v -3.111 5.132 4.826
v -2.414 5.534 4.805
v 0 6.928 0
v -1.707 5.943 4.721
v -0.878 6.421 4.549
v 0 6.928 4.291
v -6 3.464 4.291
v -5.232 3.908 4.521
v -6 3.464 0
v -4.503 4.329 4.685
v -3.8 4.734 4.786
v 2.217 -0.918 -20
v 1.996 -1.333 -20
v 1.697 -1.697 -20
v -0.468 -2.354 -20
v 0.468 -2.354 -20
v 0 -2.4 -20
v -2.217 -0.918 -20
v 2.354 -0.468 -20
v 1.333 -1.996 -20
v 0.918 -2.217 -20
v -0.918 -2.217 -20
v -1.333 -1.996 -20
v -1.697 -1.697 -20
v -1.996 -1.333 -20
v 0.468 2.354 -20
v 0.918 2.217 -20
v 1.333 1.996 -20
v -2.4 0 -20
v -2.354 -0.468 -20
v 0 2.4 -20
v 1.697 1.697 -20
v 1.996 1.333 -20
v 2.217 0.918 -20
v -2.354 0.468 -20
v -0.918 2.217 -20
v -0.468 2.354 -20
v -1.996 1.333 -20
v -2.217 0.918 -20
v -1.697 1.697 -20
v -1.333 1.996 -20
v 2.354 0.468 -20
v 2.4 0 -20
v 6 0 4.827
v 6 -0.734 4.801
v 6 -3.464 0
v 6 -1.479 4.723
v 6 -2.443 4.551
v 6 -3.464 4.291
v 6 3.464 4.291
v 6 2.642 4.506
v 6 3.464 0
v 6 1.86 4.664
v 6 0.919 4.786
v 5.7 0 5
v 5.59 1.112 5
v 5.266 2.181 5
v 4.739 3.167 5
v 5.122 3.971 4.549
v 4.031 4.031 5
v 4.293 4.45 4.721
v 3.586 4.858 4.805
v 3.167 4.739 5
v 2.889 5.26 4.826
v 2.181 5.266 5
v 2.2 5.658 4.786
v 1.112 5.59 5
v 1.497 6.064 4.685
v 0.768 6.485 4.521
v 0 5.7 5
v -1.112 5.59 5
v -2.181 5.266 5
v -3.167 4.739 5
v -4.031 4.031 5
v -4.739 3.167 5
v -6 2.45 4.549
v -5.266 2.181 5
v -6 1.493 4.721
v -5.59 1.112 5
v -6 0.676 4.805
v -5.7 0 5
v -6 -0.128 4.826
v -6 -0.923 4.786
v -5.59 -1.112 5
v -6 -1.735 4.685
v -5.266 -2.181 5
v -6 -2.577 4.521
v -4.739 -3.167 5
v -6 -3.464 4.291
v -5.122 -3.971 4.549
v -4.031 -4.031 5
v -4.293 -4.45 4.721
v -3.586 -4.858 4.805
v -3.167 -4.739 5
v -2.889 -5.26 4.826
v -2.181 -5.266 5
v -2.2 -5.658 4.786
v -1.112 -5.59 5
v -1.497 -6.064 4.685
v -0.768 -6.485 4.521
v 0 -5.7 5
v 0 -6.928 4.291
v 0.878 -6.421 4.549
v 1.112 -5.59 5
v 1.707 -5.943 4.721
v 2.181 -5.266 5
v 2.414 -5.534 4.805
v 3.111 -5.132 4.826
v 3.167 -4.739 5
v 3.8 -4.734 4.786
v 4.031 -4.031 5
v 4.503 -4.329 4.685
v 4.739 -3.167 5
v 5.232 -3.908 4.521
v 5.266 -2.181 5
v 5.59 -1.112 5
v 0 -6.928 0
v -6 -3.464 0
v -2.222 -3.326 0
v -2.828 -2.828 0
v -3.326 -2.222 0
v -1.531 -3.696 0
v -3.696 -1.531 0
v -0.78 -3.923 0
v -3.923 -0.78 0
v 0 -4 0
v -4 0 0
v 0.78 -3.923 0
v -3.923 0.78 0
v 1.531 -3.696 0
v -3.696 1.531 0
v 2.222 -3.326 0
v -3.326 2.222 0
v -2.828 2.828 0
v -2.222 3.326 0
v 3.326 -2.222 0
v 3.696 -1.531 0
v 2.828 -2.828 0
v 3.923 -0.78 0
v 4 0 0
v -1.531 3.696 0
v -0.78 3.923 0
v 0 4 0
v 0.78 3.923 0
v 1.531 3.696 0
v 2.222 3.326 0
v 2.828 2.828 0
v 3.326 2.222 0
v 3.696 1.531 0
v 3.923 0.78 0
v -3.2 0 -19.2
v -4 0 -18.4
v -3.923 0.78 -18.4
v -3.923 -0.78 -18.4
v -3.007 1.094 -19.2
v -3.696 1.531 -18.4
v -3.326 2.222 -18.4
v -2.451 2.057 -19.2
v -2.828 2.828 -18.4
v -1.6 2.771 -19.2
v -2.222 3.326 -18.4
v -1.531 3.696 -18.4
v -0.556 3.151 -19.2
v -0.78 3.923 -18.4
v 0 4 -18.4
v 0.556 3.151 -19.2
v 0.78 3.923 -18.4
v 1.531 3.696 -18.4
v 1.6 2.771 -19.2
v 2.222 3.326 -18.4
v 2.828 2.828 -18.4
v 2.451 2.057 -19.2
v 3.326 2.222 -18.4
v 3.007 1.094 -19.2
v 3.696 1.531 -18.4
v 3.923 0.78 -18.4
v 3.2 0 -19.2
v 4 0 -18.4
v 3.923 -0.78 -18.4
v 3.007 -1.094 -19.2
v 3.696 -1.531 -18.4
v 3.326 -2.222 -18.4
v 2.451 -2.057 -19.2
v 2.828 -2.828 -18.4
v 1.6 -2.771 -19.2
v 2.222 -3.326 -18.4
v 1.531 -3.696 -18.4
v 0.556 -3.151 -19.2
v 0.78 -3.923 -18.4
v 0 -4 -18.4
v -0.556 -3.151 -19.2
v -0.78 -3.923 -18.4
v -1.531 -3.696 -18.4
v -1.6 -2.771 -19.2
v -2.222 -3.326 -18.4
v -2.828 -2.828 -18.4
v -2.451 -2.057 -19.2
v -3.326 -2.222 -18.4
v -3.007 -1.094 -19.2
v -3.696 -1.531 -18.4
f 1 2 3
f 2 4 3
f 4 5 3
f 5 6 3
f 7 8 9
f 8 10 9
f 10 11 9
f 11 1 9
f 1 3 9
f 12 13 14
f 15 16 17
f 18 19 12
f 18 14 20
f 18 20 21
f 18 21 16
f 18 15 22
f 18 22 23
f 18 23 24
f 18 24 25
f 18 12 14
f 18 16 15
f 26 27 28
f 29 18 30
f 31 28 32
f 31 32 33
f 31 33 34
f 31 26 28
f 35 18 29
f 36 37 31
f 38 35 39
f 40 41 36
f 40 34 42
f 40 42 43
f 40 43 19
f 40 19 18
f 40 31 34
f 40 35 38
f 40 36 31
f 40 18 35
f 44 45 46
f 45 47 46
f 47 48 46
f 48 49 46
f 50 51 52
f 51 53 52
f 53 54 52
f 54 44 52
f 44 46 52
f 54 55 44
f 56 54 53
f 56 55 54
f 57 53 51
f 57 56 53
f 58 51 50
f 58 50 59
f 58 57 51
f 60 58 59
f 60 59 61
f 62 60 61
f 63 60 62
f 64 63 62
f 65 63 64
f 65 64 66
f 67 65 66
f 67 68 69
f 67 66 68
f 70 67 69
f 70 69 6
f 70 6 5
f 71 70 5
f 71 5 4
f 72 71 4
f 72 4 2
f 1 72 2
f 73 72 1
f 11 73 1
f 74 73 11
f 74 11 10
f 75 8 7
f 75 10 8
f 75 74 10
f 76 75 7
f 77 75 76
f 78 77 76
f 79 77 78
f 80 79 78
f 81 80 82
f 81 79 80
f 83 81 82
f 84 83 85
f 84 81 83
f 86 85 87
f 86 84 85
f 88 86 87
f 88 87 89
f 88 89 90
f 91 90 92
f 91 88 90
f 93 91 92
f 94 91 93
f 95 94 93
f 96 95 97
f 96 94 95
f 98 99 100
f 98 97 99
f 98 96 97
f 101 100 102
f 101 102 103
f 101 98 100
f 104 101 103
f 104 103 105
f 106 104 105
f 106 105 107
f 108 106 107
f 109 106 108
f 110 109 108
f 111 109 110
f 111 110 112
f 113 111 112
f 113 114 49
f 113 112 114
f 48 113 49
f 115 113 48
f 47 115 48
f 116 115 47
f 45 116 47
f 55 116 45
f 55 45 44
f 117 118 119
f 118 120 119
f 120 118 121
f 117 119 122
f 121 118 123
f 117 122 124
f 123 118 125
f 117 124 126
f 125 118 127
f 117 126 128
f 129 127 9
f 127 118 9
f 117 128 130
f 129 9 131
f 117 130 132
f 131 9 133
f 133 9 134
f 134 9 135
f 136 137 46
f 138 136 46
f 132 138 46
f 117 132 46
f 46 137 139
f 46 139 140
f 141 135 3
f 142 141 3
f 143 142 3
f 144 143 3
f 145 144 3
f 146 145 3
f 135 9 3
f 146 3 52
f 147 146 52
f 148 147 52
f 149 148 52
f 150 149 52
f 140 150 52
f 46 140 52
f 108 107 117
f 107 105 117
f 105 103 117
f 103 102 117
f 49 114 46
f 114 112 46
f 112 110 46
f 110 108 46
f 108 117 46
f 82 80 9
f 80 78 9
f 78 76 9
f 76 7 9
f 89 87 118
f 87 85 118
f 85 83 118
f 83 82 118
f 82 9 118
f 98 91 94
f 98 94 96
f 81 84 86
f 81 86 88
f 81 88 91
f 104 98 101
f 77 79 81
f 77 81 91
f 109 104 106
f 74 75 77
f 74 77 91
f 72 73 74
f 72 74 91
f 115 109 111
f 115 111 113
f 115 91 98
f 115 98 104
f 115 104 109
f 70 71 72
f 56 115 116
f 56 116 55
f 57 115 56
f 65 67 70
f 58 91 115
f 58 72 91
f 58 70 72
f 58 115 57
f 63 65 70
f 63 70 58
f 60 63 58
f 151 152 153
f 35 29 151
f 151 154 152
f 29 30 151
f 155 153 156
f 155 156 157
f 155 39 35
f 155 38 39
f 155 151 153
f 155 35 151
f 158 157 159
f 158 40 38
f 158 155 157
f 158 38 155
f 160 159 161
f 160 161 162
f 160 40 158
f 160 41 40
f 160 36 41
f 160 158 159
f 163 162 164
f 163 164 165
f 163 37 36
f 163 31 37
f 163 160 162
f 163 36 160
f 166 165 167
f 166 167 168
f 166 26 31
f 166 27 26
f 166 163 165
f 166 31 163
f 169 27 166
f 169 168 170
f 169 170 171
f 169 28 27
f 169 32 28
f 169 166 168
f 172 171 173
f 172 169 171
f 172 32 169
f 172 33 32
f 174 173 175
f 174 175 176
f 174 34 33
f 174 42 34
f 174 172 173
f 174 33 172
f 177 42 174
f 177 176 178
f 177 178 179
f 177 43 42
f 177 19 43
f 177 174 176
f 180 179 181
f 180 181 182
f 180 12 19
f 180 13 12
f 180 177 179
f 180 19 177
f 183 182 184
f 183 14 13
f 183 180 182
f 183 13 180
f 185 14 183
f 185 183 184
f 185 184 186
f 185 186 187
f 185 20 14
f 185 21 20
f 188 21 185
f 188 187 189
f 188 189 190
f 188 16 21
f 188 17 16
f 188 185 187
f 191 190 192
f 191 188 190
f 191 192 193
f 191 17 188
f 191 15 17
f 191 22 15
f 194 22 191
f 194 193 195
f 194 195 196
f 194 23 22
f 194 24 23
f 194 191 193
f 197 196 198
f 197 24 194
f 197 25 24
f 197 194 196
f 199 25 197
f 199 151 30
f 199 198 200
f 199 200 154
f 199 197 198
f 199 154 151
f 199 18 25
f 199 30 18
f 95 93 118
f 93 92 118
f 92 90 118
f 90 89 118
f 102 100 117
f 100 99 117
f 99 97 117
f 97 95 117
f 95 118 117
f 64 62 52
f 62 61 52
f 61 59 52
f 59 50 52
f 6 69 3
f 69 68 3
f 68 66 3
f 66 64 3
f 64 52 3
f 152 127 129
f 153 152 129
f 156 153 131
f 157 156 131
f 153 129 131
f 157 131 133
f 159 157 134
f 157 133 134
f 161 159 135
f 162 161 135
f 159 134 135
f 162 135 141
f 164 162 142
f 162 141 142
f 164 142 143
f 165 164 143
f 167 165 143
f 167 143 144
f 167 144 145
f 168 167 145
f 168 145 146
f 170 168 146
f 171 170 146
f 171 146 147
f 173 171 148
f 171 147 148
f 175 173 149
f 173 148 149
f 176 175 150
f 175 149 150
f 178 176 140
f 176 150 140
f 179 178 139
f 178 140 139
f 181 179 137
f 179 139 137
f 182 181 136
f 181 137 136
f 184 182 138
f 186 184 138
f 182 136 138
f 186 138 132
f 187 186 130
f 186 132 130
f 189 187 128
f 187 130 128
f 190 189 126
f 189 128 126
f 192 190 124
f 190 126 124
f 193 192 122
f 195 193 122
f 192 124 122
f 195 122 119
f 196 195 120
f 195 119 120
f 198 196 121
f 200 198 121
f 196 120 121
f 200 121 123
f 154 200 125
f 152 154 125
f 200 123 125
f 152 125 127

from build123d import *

# Parameters (mm, degrees)
EXTRUDE_339_DEPTH     = 5
SKETCH_D_OUTSIDE_W    = 52.442
SKETCH_D_OUTSIDE_H    = 54.298
SKETCH_D_OUTSIDE_R    = 5.7
CUT_EXTRUDE_383_DEPTH = 10
CUT_EXTRUDE_383_DRAFT = -60
SKETCH_418_R          = 4
EXTRUDE_481_DEPTH     = 20
CHAMFER_526_SIZE      = 1.6


with BuildPart() as part:
    # Sketch 332 → Extrude 339 (new body)
    with BuildSketch(Plane.XY):
        Polygon((0, -6.92820323), (6, -3.464101615), (6, 3.464101615), (0, 6.92820323), (-6, 3.464101615), (-6, -3.464101615), align=None)
    extrude(amount=EXTRUDE_339_DEPTH)


with BuildPart() as cut_extrude_383_tool:
    # D outside → Cut-Extrude 383 (with draft: the straight prism first)
    with BuildSketch(Plane.XY.offset(5)):
        Rectangle(SKETCH_D_OUTSIDE_W, SKETCH_D_OUTSIDE_H)
        Circle(SKETCH_D_OUTSIDE_R, mode=Mode.SUBTRACT)
    extrude(amount=-CUT_EXTRUDE_383_DEPTH)
    # Cut-Extrude 383: the draft: its side faces are tilted about the plane it starts from
    cut_extrude_383_sides = [cut_extrude_383_tool.faces().sort_by_distance(p)[0] for p in [
        (0, -27.149, 0),
        (26.221, 0, 0),
        (0, 27.149, 0),
        (-26.221, 0, 0),
        (-5.7, 0, 0),
    ]]
    draft(cut_extrude_383_sides, Plane.XY.offset(5), CUT_EXTRUDE_383_DRAFT)


with BuildPart() as part_1:
    add(part.part)

    # Cut-Extrude 383: cut by cut_extrude_383_tool
    add(cut_extrude_383_tool.part, mode=Mode.SUBTRACT)

    # Sketch 418 → Extrude 481 (add)
    with BuildSketch(Plane(origin=(0, 0, 0), x_dir=(-1, 0, 0), z_dir=(0, 0, -1))):
        Circle(SKETCH_418_R)
    extrude(amount=EXTRUDE_481_DEPTH)

    # Chamfer 526
    chamfer_526_edges = [part_1.edges().sort_by_distance(p)[0] for p in [
        (4, 0, -20),
    ]]
    chamfer(chamfer_526_edges, length=CHAMFER_526_SIZE)


solid = part_1.part
